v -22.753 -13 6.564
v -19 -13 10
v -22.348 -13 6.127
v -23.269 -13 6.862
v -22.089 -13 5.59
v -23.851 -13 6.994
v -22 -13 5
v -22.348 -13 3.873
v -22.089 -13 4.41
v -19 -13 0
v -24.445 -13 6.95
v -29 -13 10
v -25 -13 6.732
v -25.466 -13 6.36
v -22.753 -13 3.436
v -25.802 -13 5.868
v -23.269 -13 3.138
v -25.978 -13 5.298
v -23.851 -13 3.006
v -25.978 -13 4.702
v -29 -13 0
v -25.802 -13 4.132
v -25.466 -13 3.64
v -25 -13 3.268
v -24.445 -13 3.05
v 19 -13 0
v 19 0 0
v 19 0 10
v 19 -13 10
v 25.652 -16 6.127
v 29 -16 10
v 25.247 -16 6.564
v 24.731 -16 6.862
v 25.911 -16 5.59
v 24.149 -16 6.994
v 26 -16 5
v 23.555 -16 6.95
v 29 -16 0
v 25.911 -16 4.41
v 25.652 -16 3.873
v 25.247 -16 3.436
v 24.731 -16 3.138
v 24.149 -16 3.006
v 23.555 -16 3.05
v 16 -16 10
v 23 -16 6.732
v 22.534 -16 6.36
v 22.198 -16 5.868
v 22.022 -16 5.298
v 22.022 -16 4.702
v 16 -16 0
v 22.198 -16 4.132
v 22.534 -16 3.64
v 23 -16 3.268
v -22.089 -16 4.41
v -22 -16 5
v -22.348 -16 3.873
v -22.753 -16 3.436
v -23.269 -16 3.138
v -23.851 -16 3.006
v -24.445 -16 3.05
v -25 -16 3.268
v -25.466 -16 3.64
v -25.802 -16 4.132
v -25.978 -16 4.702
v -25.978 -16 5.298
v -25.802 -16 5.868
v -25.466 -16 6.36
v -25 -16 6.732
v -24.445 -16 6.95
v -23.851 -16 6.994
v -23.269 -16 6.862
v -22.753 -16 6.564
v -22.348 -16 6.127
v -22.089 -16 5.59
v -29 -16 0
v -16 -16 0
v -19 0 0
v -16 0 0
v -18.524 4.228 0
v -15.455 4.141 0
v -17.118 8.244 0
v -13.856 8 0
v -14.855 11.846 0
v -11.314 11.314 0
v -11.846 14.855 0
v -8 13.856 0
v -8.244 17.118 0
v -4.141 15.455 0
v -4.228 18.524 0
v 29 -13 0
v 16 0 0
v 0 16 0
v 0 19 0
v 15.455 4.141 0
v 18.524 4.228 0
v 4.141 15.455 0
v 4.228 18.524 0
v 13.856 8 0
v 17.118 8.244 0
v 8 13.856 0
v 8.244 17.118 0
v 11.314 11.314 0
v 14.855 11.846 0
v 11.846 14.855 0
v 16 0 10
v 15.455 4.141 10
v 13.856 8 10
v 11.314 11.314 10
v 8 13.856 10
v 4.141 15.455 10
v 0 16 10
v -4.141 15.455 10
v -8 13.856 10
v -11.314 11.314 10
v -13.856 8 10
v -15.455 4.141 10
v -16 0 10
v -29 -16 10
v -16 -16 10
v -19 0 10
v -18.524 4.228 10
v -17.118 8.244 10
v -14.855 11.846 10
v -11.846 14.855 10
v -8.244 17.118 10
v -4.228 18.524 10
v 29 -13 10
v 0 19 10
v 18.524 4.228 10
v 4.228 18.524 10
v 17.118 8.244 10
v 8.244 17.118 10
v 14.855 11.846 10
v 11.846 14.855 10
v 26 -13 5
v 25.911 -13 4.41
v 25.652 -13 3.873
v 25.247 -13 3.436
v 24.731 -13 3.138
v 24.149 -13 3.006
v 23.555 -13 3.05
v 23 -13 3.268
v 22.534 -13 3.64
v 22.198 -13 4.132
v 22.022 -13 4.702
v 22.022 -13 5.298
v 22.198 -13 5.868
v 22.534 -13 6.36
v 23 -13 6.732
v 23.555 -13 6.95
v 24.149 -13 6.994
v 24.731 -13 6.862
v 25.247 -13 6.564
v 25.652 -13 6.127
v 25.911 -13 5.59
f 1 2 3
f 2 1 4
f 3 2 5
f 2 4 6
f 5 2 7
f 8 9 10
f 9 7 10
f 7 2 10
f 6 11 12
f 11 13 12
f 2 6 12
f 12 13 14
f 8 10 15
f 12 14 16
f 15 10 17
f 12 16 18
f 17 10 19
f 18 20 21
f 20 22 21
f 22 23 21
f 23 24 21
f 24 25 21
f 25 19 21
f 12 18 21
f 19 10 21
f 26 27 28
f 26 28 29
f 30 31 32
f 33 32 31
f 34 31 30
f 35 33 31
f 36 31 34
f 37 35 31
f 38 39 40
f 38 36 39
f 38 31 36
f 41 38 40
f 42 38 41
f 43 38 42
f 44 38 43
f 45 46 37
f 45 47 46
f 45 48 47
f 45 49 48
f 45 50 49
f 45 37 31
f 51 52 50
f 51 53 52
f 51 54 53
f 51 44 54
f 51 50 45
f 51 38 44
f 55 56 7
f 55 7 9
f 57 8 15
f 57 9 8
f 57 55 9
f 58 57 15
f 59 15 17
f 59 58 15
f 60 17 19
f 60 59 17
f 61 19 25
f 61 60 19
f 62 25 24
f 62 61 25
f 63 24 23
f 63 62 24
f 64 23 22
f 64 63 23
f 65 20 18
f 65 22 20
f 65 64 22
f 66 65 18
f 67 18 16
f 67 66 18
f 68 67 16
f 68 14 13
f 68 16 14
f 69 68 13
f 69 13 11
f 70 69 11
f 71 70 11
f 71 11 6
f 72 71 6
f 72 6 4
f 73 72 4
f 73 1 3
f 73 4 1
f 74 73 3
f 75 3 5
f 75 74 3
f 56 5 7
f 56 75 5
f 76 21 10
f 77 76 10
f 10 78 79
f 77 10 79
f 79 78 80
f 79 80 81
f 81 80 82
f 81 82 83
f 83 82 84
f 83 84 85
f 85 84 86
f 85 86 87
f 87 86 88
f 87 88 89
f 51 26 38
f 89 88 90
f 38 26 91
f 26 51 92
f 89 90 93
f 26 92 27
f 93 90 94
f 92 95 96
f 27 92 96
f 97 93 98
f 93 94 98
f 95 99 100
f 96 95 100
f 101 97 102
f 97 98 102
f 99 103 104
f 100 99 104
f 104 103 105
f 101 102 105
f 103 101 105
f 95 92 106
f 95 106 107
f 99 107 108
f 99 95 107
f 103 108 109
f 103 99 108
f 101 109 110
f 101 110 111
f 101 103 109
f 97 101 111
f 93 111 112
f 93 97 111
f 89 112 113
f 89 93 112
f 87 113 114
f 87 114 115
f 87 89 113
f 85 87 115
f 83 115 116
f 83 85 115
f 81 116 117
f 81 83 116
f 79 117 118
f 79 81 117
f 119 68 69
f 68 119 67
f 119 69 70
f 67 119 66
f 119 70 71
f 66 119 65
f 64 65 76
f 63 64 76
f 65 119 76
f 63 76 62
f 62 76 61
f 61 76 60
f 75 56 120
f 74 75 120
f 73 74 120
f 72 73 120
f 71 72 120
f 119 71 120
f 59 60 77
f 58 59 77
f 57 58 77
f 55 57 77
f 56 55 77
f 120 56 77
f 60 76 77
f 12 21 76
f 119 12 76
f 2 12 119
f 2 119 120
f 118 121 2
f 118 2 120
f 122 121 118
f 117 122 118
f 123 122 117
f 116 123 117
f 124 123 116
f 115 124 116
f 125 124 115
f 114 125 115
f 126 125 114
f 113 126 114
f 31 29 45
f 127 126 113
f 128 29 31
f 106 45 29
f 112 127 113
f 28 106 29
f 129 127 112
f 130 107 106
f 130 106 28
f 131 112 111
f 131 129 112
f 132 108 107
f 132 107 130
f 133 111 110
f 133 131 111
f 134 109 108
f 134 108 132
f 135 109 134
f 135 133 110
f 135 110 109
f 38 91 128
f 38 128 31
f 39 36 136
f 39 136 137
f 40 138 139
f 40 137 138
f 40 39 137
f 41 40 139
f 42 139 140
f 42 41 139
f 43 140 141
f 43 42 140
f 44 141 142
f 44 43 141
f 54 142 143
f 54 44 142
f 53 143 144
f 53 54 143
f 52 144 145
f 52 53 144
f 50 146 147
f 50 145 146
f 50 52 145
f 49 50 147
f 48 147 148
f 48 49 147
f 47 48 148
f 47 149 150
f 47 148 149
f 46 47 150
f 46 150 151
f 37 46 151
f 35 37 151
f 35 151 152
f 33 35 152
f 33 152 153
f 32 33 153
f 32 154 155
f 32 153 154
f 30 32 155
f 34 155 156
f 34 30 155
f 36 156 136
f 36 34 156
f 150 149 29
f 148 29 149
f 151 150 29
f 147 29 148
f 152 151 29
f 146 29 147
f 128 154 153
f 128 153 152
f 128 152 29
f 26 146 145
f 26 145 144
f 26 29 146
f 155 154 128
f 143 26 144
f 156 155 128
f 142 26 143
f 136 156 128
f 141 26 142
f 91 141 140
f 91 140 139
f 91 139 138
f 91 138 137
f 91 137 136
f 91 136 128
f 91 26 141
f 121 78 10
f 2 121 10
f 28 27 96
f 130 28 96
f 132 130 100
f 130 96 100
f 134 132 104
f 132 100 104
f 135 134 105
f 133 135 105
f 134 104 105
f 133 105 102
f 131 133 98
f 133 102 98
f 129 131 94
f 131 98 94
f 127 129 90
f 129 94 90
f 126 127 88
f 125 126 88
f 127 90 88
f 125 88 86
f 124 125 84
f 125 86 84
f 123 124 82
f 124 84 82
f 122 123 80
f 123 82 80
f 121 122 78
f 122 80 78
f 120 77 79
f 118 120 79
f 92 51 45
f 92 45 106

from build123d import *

# Parameters (mm, degrees)
CYLINDER001_R     = 2
CYLINDER001_DEPTH = 10
CYLINDER_R        = 2
CYLINDER_DEPTH    = 10
EXTRUDE_DEPTH     = 10


with BuildPart() as cylinder001:
    # Cylinder001 → Cylinder001 (new body)
    with BuildSketch(Plane(origin=(-24, -19, 5), x_dir=(1, 0, 0), z_dir=(0, 1, 0))):
        Circle(CYLINDER001_R)
    extrude(amount=CYLINDER001_DEPTH)


with BuildPart() as cylinder:
    # Cylinder → Cylinder (new body)
    with BuildSketch(Plane(origin=(24, -19, 5), x_dir=(1, 0, 0), z_dir=(0, 1, 0))):
        Circle(CYLINDER_R)
    extrude(amount=CYLINDER_DEPTH)


with BuildPart() as cut001:
    # Sketch → Extrude (new body)
    with BuildSketch(Plane.XY):
        with BuildLine():
            ThreePointArc((19, 0), (0, 19), (-19, 0))
            Line((-19, 0), (-19, -13))
            Line((-19, -13), (-29, -13))
            Line((-29, -13), (-29, -16))
            Line((-29, -16), (-16, -16))
            Line((-16, -16), (-16, 0))
            ThreePointArc((16, 0), (0, 16), (-16, 0))
            Line((16, -16), (16, 0))
            Line((29, -16), (16, -16))
            Line((29, -13), (29, -16))
            Line((19, -13), (29, -13))
            Line((19, 0), (19, -13))
        make_face()
    extrude(amount=EXTRUDE_DEPTH)

    # Cut: cut Cylinder
    add(cylinder.part, mode=Mode.SUBTRACT)

    # Cut001: cut Cylinder001
    add(cylinder001.part, mode=Mode.SUBTRACT)


solid = cut001.part
